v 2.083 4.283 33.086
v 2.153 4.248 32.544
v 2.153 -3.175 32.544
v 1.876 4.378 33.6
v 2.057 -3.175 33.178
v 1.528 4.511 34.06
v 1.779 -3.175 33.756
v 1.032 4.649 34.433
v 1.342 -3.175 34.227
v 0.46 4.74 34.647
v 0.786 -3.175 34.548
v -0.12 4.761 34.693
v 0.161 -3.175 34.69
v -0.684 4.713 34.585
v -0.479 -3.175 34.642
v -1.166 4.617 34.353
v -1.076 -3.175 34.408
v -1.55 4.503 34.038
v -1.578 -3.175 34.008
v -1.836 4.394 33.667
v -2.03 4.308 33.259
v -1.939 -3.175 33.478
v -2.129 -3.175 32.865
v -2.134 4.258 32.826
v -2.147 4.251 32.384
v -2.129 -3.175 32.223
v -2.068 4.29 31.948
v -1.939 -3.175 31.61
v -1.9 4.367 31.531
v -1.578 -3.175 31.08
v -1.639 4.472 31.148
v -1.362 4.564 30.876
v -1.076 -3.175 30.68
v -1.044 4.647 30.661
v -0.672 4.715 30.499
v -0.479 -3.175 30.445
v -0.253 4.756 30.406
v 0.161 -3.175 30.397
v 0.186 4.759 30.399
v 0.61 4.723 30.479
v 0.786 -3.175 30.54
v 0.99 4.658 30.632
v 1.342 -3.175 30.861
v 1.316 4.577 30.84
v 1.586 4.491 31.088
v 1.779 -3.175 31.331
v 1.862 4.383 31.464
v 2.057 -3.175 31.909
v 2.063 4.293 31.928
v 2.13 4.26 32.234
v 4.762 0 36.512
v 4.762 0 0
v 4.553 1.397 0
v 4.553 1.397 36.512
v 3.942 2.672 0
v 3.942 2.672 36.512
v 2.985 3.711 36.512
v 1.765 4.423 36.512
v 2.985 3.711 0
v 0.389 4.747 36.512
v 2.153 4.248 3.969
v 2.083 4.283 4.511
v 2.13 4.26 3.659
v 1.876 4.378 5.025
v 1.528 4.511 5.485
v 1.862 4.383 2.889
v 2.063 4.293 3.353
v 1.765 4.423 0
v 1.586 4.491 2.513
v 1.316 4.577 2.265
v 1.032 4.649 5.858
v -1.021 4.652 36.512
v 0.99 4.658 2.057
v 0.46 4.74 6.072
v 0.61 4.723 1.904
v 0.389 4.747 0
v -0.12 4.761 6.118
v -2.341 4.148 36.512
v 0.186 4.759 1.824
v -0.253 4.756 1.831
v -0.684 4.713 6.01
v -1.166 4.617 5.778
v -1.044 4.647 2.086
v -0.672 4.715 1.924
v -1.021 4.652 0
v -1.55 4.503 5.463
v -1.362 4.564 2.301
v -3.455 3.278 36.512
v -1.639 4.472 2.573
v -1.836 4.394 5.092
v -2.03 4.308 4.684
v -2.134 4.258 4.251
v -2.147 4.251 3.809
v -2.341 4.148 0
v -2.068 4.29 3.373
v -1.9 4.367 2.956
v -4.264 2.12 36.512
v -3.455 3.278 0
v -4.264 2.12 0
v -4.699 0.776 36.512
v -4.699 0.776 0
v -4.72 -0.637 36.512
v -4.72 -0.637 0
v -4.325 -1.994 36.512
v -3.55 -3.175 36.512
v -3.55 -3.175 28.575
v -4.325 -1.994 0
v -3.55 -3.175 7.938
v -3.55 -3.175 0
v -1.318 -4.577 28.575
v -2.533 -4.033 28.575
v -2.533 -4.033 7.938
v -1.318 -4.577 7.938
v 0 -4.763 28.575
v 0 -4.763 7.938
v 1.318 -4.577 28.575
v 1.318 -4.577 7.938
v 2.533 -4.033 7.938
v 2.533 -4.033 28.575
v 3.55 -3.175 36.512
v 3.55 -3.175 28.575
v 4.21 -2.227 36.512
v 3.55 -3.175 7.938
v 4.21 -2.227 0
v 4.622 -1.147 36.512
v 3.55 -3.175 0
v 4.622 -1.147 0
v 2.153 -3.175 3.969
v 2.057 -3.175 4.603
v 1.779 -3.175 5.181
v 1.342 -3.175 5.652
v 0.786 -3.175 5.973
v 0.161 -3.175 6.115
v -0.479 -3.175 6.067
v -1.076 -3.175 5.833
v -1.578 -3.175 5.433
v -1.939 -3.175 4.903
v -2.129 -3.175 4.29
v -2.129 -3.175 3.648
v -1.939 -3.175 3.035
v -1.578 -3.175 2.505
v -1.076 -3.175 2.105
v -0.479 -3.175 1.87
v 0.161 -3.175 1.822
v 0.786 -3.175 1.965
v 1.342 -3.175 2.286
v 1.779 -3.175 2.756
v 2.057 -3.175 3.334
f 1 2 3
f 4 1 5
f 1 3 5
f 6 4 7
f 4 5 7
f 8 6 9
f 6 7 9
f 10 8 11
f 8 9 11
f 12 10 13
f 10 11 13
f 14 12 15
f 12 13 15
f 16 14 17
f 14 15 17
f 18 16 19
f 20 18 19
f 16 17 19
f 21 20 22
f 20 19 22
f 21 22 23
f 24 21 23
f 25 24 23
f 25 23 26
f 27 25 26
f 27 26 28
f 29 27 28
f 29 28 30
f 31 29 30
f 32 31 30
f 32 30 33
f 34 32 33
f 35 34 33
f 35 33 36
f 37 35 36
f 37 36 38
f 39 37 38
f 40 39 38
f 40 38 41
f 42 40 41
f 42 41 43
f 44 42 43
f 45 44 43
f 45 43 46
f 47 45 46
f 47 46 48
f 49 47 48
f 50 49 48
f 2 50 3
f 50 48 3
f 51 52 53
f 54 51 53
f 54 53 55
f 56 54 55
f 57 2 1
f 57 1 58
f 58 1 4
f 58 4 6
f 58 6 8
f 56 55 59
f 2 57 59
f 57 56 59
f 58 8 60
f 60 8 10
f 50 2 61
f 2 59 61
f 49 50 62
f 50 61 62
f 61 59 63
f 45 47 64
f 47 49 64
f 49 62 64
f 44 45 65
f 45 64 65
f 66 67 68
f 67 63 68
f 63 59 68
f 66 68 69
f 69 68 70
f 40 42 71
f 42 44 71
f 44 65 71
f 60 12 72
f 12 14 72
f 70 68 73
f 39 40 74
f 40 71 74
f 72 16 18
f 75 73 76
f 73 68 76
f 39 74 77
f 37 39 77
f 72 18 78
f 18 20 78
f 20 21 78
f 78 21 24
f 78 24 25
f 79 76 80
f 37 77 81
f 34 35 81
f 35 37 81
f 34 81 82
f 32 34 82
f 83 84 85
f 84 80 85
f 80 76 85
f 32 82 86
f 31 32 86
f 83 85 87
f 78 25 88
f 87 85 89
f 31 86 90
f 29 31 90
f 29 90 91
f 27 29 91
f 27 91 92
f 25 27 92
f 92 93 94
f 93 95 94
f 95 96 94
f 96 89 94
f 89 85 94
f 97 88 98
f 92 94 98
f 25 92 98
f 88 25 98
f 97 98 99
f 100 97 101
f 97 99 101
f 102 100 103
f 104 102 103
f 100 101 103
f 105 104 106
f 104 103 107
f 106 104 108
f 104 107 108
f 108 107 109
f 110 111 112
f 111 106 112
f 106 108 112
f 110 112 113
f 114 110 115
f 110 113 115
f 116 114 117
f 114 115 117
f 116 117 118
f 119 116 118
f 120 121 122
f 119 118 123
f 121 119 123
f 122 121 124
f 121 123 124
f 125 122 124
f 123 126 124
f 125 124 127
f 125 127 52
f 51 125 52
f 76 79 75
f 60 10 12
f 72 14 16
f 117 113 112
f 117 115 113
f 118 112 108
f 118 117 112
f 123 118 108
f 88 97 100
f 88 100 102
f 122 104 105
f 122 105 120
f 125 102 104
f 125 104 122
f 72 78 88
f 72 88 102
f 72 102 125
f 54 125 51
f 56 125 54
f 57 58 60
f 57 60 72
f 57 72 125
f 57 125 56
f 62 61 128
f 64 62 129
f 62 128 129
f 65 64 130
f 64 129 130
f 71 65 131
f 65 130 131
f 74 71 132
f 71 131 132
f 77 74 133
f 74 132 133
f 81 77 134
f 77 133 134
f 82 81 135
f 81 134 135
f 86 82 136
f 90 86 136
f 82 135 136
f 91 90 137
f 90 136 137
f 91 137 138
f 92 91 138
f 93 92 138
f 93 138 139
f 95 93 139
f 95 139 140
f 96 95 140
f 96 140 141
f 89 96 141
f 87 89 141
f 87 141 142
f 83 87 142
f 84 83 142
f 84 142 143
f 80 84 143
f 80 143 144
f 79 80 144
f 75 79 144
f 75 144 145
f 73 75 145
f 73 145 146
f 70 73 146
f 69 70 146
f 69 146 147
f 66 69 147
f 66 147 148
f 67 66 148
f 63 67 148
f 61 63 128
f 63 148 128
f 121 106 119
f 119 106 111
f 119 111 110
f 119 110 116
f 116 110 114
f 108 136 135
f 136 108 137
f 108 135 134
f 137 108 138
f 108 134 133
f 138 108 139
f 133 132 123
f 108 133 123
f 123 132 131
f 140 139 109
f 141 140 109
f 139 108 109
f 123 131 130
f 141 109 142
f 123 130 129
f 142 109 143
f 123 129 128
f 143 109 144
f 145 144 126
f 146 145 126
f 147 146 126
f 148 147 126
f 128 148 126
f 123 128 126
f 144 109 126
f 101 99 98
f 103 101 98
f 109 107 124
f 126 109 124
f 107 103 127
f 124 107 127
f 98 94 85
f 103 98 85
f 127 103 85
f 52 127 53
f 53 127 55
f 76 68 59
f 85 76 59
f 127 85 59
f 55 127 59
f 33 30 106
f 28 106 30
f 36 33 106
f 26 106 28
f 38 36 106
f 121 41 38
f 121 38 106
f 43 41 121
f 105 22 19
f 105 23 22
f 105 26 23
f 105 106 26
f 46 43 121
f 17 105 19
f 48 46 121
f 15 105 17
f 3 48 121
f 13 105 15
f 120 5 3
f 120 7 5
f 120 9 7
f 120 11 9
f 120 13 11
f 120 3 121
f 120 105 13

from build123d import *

# Parameters (mm, degrees)
F0_R     = 4.7625
F1_DEPTH = 36.5125
F2_W     = 7.0995158286
F2_H     = 1.5875
F3_DEPTH = 7.9375
F4_W     = 7.0995158286
F4_H     = 1.5875
F5_DEPTH = 7.9375
F6_R     = 2.15265
F7_DEPTH = 8.9375001002


with BuildPart() as f1:
    # F0 (on Top) → F1 (new body)
    with BuildSketch(Plane.XY):
        Circle(F0_R)
    extrude(amount=F1_DEPTH)

    # F2 (on face) → F3 (cut)
    with BuildSketch(Plane.XY.offset(36.5125)):
        with Locations((0, -3.96875)):
            Rectangle(F2_W, F2_H)
    extrude(amount=-F3_DEPTH, mode=Mode.SUBTRACT)

    # F4 (on face) → F5 (cut)
    with BuildSketch(Plane(origin=(0, 0, 0), x_dir=(1, 0, 0), z_dir=(0, 0, -1))):
        with Locations((0, 3.96875)):
            Rectangle(F4_W, F4_H)
    extrude(amount=-F5_DEPTH, mode=Mode.SUBTRACT)

    # F6 (on face) → F7 (cut, up to face)
    with BuildSketch(Plane.XZ.offset(3.175)):
        with Locations((0, 32.54375)):
            Circle(F6_R)
        with Locations((0, 3.96875)):
            Circle(F6_R)
    extrude(amount=-F7_DEPTH, mode=Mode.SUBTRACT)


solid = f1.part
